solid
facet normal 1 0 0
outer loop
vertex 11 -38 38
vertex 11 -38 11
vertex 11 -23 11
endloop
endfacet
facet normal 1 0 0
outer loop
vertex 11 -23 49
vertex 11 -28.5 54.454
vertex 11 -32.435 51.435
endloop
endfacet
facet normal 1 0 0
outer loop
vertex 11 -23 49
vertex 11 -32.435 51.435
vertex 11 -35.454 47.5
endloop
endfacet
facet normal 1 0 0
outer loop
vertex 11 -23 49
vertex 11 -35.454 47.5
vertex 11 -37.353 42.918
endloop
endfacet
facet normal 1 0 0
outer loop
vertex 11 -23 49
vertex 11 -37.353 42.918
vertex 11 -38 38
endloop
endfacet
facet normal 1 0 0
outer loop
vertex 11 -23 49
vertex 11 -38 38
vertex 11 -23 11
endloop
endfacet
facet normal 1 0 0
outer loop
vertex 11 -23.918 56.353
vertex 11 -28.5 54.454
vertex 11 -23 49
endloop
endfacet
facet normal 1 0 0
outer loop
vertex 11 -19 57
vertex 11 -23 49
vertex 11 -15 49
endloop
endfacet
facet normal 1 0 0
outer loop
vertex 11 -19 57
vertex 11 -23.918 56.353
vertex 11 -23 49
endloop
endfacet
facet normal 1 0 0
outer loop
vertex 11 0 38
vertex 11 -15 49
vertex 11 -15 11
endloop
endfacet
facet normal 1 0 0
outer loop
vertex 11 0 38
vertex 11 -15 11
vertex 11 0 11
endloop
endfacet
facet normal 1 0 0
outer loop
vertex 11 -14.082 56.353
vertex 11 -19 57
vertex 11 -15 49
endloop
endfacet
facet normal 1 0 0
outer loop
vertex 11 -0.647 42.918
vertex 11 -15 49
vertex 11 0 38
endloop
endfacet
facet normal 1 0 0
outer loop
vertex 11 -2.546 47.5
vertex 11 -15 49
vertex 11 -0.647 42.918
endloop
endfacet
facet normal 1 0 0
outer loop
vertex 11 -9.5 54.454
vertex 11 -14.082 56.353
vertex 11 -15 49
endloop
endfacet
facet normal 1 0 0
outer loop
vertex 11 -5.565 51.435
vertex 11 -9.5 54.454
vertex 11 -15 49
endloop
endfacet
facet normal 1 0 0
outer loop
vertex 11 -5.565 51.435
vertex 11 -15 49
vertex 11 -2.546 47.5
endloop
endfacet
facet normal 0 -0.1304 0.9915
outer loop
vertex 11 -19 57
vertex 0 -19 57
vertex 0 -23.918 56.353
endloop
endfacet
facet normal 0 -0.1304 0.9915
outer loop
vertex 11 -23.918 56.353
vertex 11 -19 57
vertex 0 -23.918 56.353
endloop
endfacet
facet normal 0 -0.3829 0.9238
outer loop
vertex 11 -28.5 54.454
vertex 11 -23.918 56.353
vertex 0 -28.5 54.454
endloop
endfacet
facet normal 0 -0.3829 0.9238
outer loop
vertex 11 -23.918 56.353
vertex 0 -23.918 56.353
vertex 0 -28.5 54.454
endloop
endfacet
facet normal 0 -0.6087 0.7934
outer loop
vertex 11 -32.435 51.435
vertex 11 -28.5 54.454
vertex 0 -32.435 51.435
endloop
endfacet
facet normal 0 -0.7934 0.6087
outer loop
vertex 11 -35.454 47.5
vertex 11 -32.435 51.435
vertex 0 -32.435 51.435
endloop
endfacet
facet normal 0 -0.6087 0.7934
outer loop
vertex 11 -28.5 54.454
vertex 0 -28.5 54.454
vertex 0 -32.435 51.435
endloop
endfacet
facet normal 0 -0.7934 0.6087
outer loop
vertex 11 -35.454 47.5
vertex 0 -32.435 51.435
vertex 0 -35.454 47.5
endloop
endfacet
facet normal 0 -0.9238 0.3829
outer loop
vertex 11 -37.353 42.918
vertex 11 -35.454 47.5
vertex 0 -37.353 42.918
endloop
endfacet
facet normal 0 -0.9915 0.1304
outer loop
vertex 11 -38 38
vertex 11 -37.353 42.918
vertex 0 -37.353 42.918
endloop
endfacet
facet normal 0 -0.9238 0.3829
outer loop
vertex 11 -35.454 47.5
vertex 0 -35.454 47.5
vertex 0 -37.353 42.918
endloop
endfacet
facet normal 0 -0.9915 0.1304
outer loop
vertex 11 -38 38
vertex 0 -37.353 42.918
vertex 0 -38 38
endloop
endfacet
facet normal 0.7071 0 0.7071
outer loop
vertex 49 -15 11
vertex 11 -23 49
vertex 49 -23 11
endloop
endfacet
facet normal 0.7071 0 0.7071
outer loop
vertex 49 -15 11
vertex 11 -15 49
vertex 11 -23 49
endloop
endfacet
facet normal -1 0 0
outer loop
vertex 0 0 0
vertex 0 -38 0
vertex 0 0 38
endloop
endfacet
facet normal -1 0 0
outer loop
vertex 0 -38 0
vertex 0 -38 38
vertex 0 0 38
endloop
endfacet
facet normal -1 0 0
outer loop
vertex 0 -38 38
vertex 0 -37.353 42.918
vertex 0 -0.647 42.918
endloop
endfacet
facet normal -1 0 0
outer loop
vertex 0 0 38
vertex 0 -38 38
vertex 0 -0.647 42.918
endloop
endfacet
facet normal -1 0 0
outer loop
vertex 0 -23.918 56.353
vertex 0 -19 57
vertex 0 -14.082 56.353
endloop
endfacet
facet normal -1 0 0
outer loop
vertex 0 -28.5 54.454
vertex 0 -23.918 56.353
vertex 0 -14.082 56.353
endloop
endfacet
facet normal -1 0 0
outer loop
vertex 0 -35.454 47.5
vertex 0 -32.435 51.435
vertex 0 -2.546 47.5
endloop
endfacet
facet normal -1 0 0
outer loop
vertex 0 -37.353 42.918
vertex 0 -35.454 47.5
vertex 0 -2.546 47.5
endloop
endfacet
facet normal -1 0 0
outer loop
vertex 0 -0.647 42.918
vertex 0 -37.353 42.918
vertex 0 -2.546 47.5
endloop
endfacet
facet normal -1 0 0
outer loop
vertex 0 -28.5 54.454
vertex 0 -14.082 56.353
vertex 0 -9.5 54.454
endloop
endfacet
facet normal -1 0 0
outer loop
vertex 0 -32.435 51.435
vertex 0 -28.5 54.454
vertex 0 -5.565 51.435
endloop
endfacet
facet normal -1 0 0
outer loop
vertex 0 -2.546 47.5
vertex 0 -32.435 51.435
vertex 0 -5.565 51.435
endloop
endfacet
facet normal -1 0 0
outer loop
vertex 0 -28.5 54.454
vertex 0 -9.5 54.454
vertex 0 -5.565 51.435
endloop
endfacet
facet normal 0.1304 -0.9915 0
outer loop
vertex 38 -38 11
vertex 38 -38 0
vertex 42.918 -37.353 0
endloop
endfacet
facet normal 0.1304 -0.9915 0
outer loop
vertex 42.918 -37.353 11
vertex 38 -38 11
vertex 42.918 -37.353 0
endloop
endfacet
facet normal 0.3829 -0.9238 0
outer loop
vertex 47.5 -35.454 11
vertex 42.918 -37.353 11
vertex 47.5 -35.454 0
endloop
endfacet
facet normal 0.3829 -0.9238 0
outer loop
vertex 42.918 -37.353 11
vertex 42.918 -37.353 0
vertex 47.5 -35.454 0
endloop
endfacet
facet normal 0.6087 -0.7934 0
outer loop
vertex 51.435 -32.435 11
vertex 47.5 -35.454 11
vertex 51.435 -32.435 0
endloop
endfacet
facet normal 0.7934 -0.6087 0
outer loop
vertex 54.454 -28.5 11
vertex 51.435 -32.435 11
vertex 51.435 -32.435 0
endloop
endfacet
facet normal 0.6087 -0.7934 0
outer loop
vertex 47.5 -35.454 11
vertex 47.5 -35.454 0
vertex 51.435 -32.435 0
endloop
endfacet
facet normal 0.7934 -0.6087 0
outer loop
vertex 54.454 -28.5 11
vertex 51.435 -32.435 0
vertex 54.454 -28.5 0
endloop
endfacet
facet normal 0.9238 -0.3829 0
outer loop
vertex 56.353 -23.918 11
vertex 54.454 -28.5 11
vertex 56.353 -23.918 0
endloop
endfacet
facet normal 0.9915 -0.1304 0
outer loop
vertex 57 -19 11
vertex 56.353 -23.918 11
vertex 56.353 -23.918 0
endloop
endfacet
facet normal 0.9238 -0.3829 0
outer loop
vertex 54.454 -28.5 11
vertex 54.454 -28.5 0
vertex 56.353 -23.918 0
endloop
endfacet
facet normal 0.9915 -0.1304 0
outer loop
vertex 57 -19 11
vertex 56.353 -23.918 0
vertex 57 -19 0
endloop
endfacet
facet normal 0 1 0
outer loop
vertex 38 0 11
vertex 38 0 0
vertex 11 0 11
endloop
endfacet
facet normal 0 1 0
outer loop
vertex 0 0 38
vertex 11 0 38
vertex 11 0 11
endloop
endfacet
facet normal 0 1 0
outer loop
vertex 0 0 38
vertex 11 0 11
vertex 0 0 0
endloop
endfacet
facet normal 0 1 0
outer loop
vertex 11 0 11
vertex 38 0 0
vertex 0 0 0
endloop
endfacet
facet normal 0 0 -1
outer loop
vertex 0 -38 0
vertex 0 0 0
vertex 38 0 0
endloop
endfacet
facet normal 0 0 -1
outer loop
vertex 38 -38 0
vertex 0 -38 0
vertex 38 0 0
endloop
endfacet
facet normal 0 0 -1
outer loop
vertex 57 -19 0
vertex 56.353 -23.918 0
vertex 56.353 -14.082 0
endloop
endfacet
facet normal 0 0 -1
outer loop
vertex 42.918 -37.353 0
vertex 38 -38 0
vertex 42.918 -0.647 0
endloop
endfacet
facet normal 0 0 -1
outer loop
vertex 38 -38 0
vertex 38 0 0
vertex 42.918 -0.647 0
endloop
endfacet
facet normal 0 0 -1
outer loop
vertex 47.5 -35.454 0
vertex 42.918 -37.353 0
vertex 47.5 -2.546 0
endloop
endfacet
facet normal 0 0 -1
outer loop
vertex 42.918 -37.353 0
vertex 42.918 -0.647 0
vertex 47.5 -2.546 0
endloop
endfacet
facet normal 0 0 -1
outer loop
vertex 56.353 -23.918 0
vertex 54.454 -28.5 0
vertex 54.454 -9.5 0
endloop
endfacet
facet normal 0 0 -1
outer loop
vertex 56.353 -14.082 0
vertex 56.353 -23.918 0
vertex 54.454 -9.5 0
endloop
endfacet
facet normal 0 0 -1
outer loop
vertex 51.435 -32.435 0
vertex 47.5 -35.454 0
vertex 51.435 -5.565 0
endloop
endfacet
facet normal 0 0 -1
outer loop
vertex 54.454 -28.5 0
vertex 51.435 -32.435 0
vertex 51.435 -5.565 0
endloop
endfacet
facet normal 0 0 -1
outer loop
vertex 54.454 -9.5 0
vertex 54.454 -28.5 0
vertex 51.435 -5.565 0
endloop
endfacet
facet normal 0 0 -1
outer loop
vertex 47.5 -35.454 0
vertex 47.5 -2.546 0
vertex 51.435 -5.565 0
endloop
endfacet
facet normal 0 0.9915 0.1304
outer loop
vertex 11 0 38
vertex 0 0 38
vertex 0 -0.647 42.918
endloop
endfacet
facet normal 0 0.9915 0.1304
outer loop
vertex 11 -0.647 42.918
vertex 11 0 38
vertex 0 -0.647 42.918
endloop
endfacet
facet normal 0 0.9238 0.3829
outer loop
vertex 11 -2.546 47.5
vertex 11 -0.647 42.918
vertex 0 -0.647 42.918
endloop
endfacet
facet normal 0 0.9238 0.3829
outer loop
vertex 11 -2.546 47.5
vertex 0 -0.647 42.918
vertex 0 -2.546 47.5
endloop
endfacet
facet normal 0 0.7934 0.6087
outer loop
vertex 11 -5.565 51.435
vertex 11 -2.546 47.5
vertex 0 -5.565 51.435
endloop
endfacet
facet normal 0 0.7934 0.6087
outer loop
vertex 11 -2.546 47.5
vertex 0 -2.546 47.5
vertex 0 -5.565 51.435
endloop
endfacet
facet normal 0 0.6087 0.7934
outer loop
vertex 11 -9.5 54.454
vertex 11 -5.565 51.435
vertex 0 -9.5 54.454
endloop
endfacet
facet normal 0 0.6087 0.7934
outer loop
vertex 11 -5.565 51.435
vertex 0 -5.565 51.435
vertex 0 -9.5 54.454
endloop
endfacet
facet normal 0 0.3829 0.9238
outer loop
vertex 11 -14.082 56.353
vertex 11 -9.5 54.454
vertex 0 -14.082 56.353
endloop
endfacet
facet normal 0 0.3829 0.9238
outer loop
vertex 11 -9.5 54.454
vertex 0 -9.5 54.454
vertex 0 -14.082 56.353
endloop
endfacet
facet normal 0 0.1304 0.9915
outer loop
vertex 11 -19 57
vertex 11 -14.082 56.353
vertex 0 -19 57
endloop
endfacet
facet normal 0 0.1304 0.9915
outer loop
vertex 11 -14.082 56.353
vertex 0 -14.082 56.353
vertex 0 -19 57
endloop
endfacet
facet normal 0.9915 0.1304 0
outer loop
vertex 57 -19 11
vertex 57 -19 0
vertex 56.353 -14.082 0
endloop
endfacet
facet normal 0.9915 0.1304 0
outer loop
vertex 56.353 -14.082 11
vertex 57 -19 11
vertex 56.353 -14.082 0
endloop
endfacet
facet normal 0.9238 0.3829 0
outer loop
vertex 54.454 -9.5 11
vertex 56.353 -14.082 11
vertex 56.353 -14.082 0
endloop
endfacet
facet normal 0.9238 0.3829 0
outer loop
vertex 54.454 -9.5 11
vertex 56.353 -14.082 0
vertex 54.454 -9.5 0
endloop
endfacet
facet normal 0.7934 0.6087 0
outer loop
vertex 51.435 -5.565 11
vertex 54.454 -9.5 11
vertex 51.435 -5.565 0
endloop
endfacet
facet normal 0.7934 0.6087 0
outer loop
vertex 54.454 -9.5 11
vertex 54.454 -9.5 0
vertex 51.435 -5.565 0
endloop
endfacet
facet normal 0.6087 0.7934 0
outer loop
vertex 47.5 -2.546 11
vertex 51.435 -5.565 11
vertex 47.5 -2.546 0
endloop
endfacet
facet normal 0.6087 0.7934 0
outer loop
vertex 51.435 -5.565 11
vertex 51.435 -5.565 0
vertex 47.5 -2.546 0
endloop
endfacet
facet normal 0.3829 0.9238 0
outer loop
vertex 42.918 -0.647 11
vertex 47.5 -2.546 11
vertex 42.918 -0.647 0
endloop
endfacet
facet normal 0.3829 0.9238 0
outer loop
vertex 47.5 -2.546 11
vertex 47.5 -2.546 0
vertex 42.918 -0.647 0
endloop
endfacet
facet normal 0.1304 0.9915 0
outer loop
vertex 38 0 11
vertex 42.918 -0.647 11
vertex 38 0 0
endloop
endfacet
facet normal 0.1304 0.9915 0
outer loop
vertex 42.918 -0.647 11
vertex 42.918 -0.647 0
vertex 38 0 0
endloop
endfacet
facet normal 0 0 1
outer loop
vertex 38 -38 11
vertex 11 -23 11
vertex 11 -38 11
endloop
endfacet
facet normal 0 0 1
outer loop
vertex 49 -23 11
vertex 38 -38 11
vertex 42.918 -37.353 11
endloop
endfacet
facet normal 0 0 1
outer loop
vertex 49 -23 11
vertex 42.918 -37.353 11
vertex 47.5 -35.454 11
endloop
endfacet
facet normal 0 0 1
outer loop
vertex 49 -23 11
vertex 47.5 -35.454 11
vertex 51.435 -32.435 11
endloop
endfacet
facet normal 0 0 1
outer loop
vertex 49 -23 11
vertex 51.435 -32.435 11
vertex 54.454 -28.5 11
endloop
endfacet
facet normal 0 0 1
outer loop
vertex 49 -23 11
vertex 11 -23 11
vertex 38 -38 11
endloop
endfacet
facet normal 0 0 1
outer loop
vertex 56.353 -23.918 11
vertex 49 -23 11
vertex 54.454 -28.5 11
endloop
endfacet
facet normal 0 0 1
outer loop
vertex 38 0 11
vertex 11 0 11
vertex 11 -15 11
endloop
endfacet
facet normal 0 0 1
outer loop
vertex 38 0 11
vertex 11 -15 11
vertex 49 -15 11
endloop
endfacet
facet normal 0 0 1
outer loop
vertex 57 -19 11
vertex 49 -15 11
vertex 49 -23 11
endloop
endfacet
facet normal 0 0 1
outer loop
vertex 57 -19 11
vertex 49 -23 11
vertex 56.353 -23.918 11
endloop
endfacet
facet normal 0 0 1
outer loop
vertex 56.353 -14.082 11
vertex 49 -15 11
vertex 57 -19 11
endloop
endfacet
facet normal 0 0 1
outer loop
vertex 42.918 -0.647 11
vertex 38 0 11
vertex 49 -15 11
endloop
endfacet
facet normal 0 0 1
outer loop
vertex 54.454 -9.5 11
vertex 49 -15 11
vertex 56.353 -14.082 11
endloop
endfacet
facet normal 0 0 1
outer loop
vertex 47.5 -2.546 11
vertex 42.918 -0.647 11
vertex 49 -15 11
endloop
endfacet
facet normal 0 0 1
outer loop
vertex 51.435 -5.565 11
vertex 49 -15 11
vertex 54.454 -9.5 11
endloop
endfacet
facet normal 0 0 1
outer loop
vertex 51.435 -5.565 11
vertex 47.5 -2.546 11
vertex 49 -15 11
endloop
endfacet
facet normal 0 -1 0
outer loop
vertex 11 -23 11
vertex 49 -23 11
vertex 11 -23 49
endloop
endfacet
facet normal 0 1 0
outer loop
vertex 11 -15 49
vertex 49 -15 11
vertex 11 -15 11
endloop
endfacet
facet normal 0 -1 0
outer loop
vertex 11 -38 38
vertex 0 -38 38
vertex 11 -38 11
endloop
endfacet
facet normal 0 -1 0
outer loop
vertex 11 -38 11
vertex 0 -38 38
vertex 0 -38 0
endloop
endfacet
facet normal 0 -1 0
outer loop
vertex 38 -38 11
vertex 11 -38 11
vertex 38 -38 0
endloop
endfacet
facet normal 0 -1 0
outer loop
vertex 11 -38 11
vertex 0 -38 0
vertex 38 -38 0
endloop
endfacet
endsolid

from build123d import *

# Parameters (mm, degrees)
F1_DEPTH = 11
F3_DEPTH = 11
F9_DEPTH = 4


with BuildPart() as f1:
    # F0 (on Right) → F1 (new body)
    with BuildSketch(Plane.YZ):
        with BuildLine():
            Line((-38, 0), (0, 0))
            Line((0, 0), (0, 38))
            ThreePointArc((0, 38), (-5.5649711575, 51.4350288425), (-19, 57))
            ThreePointArc((-19, 57), (-32.4350288425, 51.4350288425), (-38, 38))
            Line((-38, 38), (-38, 0))
        make_face()
    extrude(amount=F1_DEPTH)

    # F2 (on Top) → F3 (join)
    with BuildSketch(Plane.XY):
        with BuildLine():
            Line((38, 0), (0, 0))
            Line((0, 0), (0, -38))
            Line((0, -38), (38, -38))
            ThreePointArc((38, -38), (51.4350288425, -32.4350288425), (57, -19))
            ThreePointArc((57, -19), (51.4350288425, -5.5649711575), (38, 0))
        make_face()
    extrude(amount=F3_DEPTH)

    # F8 (on 3pt) → F9 (join, symmetric)
    with BuildSketch(Plane(origin=(0, -19, 0), x_dir=(-1, 0, 0), z_dir=(0, 1, 0))):
        Polygon((-11, 49), (-49, 11), (-11, 11), align=None)
    extrude(amount=F9_DEPTH, both=True)


solid = f1.part
